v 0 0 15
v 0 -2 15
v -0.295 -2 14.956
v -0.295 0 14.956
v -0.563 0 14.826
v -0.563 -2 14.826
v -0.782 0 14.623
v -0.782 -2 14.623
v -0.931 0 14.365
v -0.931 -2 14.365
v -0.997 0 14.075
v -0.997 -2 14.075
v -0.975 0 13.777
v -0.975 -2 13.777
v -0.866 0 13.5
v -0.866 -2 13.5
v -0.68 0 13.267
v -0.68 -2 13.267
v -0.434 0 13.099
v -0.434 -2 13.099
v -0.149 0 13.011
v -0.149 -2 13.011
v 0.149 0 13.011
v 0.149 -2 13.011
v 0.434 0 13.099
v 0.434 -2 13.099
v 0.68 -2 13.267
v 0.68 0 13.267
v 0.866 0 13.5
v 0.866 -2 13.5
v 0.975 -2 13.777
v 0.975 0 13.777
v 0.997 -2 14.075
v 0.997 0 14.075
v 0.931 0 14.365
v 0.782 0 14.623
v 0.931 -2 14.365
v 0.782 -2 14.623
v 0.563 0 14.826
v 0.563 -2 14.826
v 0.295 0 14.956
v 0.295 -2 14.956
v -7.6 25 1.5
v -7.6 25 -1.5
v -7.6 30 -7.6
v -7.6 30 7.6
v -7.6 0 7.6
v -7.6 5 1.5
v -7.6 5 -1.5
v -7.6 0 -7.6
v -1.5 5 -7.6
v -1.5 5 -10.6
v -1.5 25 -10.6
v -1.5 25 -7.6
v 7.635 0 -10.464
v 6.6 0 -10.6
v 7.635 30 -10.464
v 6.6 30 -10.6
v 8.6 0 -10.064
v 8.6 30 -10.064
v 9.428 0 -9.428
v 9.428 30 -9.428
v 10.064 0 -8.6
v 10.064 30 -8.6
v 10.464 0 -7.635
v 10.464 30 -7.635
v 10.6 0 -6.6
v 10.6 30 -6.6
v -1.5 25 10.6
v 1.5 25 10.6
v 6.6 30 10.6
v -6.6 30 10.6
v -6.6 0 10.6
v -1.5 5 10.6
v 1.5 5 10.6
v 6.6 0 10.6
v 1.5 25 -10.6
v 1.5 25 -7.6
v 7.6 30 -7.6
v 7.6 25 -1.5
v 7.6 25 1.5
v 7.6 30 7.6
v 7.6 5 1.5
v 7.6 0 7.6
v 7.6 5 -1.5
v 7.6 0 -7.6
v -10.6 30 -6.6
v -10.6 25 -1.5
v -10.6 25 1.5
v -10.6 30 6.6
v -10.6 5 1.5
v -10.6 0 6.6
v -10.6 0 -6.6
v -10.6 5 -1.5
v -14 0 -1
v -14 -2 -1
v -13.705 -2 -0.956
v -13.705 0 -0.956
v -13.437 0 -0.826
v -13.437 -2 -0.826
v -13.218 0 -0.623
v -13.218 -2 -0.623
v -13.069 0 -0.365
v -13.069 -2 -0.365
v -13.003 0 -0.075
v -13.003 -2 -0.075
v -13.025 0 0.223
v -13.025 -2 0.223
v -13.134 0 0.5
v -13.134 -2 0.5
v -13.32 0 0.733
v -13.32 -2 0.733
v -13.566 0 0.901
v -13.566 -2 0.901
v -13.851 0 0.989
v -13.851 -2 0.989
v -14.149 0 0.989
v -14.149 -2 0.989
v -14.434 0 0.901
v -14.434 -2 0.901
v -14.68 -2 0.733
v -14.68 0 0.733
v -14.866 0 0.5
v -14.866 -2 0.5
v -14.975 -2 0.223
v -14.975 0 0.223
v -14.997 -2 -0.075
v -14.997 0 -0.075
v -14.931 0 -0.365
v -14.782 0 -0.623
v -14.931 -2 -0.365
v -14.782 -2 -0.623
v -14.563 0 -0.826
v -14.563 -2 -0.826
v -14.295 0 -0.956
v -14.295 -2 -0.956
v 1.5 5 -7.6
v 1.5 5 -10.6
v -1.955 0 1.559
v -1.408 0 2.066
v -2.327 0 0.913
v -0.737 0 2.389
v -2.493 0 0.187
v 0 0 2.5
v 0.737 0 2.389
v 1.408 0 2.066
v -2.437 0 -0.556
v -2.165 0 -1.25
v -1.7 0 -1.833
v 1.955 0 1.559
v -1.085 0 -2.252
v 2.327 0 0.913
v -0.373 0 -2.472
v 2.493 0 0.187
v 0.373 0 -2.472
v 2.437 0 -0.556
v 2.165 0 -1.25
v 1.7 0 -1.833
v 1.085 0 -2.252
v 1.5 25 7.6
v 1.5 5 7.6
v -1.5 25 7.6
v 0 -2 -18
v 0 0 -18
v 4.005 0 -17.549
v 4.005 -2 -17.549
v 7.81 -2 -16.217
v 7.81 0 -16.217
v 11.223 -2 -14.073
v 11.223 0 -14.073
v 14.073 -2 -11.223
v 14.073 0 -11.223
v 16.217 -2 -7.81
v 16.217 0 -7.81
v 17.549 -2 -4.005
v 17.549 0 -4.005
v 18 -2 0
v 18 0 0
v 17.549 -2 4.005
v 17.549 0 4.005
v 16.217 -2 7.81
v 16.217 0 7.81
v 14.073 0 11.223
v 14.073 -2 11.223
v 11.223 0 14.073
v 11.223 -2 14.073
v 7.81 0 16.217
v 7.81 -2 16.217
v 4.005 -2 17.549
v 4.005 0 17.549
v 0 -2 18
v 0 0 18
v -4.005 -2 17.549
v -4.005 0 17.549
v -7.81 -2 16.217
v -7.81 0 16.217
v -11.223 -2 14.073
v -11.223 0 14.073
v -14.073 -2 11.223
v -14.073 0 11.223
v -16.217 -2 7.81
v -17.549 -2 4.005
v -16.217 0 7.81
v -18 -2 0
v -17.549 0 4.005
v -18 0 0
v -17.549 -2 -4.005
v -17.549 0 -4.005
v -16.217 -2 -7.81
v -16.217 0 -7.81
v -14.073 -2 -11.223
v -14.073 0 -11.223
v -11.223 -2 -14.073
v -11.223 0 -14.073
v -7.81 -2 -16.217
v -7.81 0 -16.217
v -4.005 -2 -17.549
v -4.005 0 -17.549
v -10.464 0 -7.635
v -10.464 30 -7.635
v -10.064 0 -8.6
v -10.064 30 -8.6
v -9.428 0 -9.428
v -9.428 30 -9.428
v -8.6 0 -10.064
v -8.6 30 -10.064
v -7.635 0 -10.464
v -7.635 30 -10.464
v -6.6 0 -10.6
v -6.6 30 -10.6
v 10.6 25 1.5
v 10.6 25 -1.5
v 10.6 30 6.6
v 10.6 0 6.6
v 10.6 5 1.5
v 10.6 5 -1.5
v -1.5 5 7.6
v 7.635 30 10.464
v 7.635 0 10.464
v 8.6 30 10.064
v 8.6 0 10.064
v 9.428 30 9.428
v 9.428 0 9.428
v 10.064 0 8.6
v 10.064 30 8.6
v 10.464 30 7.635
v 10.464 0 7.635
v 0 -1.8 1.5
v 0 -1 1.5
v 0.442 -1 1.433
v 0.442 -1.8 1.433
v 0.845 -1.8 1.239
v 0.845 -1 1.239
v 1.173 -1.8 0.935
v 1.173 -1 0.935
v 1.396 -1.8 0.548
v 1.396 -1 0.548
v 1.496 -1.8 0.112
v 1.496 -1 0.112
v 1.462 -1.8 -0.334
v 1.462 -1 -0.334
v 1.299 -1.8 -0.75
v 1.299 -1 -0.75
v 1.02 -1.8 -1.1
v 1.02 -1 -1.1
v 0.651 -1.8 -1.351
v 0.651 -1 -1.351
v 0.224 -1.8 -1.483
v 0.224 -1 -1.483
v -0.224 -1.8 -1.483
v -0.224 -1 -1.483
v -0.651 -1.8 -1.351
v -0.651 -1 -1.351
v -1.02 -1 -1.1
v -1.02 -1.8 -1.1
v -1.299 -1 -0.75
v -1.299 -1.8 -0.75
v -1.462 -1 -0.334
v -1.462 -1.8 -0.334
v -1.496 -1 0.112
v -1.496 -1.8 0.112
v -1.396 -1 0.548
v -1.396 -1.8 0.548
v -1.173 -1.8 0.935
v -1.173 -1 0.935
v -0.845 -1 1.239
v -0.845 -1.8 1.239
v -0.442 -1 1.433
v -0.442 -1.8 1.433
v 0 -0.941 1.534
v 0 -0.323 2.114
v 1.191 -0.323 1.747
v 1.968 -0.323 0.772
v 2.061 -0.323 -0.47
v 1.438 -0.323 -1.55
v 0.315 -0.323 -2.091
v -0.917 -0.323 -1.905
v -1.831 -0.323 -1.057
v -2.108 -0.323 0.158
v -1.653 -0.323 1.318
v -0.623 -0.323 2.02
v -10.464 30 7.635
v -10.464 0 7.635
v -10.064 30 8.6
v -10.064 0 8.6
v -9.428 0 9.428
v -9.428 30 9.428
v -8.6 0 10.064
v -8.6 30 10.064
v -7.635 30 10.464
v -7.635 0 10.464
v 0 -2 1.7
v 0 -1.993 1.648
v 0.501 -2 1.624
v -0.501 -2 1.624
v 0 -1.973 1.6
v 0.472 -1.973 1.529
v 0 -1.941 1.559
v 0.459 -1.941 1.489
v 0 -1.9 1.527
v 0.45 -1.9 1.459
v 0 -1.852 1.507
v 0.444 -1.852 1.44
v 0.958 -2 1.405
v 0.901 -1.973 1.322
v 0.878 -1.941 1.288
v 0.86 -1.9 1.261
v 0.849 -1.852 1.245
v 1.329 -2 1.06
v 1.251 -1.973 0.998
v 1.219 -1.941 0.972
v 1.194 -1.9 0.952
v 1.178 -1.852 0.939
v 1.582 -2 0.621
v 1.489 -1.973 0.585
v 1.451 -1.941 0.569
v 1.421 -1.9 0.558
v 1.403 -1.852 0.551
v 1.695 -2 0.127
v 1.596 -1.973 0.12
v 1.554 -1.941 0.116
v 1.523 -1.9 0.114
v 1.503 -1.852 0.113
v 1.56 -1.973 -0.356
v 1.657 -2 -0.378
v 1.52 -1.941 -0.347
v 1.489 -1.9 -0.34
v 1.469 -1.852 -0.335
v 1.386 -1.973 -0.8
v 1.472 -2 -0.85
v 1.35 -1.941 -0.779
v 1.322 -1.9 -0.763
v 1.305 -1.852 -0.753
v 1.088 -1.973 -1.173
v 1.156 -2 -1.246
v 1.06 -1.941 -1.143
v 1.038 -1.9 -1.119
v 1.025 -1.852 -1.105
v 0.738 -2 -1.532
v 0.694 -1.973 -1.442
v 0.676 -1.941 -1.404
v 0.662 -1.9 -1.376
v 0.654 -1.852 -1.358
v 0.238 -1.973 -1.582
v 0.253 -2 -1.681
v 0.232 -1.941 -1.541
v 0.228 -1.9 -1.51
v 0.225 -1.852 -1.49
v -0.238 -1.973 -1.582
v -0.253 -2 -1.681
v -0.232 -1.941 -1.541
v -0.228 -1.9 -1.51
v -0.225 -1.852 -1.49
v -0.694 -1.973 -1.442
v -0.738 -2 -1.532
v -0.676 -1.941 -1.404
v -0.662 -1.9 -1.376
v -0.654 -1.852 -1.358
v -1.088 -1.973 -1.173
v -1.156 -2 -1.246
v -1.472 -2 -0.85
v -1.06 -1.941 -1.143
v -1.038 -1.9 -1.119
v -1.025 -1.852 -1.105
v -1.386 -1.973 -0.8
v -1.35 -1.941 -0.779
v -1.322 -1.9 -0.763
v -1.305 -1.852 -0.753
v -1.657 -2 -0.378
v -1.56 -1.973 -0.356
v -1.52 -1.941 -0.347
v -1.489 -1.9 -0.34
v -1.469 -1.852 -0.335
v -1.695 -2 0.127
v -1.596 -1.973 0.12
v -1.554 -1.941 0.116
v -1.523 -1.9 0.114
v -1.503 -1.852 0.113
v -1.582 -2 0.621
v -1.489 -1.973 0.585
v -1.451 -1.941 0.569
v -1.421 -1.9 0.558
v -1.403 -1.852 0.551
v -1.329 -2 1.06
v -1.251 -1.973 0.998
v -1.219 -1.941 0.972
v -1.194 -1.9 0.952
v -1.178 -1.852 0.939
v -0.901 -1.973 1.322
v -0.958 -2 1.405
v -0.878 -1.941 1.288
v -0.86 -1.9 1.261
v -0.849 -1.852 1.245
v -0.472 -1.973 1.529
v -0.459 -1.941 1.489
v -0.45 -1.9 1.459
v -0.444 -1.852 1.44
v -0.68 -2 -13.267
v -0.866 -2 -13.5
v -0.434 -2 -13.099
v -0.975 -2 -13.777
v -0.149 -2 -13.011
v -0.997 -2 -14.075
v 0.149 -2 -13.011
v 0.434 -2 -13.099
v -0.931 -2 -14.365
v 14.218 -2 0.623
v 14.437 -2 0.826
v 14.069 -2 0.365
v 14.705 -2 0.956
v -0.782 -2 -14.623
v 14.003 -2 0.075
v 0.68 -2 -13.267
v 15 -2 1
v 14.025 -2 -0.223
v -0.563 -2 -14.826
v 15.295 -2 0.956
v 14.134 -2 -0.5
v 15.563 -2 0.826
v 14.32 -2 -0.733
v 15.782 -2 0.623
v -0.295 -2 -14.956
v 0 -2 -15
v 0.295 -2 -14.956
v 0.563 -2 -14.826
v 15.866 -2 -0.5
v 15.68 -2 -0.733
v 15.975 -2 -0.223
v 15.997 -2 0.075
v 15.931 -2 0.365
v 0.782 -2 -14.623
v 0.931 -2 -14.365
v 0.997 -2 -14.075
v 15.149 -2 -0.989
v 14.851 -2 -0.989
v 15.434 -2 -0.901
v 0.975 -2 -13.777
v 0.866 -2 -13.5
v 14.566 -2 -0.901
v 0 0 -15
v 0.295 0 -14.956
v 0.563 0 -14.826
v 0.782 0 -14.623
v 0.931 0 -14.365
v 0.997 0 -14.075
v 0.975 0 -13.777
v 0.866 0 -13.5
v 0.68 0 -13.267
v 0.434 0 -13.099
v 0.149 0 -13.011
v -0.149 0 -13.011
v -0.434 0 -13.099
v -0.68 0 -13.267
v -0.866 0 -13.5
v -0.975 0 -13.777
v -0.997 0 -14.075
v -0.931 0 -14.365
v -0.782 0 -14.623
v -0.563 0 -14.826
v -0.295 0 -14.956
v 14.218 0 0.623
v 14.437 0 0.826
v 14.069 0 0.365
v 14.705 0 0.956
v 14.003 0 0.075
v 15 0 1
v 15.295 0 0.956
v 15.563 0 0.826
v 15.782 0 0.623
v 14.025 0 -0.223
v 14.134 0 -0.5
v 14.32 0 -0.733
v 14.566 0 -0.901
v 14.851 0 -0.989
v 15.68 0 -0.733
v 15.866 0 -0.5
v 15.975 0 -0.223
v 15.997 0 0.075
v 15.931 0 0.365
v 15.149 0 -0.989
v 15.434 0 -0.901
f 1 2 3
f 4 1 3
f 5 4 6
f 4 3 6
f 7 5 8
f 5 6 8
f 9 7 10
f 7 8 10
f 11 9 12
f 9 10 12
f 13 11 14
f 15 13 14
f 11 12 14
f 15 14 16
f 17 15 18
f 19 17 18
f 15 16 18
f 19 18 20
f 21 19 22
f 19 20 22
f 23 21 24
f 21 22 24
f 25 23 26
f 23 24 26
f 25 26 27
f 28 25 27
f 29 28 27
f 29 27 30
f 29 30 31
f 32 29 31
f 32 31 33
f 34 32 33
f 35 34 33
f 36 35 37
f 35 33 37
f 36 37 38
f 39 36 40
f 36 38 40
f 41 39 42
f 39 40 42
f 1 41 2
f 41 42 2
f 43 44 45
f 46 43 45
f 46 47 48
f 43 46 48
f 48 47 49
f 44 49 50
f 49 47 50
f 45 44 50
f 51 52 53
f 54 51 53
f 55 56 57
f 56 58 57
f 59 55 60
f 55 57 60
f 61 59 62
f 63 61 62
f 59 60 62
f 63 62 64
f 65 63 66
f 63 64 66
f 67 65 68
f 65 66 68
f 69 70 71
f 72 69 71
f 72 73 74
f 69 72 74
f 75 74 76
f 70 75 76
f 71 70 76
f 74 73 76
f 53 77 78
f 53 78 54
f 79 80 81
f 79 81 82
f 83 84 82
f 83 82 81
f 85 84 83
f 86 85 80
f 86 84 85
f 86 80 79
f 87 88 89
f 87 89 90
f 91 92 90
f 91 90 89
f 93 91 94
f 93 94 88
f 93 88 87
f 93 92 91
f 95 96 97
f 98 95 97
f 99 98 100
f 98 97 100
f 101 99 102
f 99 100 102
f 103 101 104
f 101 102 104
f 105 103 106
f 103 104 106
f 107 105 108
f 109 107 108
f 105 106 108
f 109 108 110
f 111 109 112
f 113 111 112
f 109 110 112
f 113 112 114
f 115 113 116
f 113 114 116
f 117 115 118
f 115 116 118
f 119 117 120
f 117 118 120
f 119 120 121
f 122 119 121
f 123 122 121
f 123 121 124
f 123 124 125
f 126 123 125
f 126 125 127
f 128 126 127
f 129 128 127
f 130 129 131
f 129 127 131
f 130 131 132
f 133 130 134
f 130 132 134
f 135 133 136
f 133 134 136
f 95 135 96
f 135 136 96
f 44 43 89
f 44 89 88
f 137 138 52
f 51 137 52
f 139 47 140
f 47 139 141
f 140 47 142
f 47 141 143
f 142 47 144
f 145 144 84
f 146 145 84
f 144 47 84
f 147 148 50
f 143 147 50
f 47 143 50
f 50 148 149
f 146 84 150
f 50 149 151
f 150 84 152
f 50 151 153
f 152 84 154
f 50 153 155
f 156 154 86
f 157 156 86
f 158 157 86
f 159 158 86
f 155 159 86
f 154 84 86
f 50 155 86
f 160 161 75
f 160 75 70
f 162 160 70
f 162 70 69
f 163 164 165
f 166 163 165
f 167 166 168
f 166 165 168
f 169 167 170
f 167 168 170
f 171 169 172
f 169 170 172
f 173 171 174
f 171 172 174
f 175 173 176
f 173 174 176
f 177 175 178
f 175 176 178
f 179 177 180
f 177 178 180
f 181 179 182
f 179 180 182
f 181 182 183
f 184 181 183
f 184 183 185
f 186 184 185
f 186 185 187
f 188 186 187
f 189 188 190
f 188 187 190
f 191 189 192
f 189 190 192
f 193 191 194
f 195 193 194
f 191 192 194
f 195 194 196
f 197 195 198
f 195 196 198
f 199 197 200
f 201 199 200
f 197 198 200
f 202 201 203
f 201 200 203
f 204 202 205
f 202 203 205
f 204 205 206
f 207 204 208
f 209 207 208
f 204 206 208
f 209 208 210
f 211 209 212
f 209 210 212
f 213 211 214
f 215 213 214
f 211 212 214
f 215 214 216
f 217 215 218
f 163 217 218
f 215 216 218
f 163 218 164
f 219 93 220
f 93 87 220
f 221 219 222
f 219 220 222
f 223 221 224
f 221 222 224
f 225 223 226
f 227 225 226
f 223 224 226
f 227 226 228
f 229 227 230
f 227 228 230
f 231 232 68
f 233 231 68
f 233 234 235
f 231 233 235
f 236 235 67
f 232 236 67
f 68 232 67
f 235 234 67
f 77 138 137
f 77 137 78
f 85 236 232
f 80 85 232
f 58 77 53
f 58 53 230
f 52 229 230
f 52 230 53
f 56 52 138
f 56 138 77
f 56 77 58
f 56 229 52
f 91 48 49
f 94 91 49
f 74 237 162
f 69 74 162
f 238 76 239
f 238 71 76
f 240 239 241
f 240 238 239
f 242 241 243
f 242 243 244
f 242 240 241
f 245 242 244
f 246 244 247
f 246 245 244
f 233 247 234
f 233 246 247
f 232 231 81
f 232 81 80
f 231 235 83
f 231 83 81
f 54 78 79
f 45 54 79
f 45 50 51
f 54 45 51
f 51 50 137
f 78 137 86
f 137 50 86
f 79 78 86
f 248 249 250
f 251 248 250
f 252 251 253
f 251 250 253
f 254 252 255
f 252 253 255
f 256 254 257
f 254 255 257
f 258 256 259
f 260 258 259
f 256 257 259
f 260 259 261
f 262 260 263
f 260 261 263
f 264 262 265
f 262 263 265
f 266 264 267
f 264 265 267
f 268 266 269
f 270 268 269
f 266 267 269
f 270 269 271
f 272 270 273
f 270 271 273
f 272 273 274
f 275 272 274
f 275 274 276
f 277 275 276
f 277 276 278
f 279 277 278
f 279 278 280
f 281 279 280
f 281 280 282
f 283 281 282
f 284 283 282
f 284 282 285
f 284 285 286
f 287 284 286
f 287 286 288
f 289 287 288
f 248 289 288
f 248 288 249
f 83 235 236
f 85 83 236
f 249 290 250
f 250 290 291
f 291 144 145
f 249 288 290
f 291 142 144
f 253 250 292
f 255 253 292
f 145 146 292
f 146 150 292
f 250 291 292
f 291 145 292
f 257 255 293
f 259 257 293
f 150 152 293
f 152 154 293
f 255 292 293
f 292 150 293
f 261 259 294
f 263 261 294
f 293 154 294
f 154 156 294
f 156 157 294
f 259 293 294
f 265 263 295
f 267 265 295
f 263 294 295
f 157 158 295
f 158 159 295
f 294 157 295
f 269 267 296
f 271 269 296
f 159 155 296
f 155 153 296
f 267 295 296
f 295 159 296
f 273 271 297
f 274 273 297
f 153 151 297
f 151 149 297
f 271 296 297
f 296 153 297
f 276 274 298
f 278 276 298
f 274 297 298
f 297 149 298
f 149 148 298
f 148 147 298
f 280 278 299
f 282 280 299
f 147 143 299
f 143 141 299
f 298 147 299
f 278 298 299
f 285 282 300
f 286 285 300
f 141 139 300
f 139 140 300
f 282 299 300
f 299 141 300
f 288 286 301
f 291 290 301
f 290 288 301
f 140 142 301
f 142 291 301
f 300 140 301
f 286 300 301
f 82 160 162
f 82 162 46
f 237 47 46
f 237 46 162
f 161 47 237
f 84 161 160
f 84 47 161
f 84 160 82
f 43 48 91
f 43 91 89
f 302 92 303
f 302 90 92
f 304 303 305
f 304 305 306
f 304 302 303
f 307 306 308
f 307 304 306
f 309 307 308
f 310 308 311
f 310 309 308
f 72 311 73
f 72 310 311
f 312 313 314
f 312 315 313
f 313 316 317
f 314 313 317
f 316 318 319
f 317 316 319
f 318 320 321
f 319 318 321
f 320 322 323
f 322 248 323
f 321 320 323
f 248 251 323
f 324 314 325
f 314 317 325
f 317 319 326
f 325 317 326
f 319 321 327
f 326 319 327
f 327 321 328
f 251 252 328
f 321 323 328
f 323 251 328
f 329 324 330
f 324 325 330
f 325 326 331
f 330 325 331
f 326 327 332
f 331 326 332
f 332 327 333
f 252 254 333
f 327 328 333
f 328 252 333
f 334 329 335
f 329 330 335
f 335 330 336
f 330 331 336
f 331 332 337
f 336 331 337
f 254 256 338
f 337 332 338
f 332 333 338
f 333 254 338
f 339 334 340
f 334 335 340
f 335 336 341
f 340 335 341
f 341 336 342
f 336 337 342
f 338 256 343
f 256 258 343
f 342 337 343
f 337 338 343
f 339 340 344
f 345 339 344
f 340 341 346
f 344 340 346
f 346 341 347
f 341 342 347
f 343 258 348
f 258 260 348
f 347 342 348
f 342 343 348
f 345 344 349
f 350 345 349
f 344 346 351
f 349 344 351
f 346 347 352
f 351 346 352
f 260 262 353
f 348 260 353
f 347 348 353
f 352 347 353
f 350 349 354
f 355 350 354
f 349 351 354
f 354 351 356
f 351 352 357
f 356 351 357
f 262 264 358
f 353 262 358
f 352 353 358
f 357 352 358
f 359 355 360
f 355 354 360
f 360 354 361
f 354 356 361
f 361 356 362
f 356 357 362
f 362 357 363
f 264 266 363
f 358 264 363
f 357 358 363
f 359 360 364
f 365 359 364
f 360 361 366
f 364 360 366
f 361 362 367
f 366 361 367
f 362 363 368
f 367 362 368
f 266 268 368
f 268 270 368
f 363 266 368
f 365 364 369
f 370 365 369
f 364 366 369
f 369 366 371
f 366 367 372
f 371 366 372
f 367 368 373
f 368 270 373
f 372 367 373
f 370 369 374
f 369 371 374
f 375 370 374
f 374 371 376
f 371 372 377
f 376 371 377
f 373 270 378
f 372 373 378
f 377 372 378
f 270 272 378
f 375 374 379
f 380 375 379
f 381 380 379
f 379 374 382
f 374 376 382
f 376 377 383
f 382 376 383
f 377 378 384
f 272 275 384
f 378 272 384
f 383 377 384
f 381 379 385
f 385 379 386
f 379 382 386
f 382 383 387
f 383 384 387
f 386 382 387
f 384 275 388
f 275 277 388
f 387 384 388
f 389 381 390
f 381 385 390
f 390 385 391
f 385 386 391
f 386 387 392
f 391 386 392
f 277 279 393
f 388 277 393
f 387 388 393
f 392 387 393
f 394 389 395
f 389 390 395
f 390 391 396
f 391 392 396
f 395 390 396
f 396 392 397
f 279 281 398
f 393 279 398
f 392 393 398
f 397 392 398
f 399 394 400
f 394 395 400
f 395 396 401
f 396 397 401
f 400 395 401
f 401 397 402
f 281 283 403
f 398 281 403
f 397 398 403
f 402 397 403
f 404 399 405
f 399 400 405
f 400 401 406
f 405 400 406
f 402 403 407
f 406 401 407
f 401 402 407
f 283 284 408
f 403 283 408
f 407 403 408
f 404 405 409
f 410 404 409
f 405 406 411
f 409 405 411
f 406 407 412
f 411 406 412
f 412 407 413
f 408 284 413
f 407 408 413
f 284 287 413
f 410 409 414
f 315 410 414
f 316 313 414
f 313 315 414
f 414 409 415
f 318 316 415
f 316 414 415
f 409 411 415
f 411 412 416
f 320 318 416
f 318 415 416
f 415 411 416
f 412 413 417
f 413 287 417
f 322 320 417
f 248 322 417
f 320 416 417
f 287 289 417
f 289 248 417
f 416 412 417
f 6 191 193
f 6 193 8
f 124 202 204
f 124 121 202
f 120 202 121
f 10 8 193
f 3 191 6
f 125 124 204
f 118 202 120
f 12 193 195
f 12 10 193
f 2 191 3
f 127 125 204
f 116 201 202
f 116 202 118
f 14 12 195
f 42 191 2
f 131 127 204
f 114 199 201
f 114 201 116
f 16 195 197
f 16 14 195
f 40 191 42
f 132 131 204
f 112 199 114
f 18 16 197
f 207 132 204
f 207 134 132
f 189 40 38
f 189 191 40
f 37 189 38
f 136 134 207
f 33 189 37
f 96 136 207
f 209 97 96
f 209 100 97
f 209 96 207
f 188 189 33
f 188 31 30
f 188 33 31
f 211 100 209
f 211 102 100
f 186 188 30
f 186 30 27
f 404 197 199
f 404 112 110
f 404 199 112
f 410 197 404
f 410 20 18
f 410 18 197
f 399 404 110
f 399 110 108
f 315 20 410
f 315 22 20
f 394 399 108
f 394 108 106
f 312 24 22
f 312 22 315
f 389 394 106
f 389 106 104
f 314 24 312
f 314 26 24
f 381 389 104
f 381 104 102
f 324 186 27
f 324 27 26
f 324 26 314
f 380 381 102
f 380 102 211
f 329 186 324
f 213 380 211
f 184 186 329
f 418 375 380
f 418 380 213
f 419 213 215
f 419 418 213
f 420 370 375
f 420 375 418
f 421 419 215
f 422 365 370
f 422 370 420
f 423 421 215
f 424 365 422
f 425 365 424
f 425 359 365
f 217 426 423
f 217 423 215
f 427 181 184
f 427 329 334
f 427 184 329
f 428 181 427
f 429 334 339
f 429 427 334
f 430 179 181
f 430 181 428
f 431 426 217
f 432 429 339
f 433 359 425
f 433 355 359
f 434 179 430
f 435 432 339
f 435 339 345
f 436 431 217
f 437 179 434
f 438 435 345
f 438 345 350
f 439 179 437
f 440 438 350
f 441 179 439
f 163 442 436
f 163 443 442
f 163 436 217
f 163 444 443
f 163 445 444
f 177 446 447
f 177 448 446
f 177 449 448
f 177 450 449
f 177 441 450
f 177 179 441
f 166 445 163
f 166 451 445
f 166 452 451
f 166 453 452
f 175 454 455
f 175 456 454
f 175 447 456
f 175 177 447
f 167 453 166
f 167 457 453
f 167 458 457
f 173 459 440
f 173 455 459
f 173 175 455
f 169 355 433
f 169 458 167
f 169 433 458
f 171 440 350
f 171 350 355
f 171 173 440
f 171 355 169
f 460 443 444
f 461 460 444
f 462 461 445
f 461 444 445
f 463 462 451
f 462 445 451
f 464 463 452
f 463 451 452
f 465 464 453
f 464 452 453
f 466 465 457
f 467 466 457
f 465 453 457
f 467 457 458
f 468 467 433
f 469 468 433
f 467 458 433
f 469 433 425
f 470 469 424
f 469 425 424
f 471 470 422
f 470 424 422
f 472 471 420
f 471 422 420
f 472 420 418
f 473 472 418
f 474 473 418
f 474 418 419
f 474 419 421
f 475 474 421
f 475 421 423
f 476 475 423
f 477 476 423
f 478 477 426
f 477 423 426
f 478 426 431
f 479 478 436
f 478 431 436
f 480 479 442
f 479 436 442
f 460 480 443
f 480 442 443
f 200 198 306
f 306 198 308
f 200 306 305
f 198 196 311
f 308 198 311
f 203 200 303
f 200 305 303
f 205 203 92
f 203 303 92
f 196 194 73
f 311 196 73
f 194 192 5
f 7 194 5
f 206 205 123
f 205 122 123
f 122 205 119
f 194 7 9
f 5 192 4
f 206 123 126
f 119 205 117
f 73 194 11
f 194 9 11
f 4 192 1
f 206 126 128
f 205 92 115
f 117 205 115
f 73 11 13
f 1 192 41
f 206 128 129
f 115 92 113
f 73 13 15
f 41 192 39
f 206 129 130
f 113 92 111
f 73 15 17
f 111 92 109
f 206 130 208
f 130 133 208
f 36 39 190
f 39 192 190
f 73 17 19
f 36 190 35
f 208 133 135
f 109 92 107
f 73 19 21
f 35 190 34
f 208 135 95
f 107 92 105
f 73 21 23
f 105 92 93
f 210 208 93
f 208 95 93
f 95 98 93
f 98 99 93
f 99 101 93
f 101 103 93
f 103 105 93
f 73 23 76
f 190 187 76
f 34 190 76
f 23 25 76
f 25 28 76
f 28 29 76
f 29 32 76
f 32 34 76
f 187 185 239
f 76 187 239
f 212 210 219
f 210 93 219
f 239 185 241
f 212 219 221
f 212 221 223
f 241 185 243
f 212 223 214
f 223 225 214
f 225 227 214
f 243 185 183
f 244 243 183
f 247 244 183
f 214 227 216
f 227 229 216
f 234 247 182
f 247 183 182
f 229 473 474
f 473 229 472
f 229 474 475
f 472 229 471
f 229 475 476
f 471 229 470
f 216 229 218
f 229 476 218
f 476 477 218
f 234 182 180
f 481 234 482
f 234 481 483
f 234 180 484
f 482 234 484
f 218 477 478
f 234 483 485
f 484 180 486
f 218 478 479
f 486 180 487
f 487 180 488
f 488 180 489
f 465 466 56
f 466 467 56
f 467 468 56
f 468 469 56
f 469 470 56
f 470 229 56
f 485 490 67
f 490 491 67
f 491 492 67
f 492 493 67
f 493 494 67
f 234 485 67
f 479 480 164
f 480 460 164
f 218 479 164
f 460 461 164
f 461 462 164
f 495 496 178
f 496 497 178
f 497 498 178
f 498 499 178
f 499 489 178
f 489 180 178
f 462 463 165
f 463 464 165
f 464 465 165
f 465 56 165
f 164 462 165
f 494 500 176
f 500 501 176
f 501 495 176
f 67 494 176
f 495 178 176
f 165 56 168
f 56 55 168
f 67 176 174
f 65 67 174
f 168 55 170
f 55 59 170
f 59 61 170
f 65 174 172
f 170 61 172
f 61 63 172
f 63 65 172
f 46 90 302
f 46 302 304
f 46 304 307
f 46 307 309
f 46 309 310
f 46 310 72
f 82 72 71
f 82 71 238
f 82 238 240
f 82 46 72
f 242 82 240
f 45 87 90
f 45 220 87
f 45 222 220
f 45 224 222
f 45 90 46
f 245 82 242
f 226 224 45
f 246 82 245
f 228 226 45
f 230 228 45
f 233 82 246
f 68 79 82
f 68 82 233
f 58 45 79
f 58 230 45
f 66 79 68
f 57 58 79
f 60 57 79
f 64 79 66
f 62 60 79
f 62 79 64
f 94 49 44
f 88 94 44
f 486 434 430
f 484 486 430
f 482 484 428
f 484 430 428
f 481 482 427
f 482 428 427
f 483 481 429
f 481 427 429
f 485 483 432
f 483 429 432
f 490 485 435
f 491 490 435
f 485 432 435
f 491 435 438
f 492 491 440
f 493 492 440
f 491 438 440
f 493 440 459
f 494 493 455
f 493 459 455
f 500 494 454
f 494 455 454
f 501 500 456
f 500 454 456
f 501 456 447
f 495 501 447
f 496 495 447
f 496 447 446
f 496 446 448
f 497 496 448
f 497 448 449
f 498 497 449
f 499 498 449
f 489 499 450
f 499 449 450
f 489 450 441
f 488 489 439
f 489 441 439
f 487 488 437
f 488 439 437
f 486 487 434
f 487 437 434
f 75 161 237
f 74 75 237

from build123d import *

# Parameters (mm, degrees)
SKETCH1_W           = 21.2
SKETCH1_H           = 21.2
SKETCH1_W_2         = 15.2
SKETCH1_H_2         = 15.2
BOSS_EXTRUDE1_DEPTH = 30
FILLET1_R           = 4
SKETCH3_R           = 18
BOSS_EXTRUDE2_DEPTH = 2
CUT_EXTRUDE2_REACH  = 41.345
SKETCH4_R           = 1.5
SKETCH5_W           = 3
SKETCH5_H           = 20
CUT_EXTRUDE3_DEPTH  = 46.188051518
SKETCH6_W           = 3
SKETCH6_H           = 20
CUT_EXTRUDE4_DEPTH  = 46.188051518
SKETCH7_R           = 1
CUT_EXTRUDE5_DEPTH  = 2
FILLET4_SIZE        = 1
FILLET5_R           = 0.2


with BuildPart() as part:
    # Sketch1 → Boss-Extrude1 (new body)
    with BuildSketch(Plane(origin=(0, 0, 0), x_dir=(1, 0, 0), z_dir=(0, 1, 0))):
        Rectangle(SKETCH1_W, SKETCH1_H)
        Rectangle(SKETCH1_W_2, SKETCH1_H_2, mode=Mode.SUBTRACT)
    extrude(amount=BOSS_EXTRUDE1_DEPTH)

    # Fillet1
    fillet1_edges = [part.edges().sort_by_distance(p)[0] for p in [
        (10.6, 15, 10.6),
        (-10.6, 15, 10.6),
        (-10.6, 15, -10.6),
        (10.6, 15, -10.6),
    ]]
    fillet(fillet1_edges, radius=FILLET1_R)

    # Sketch3 → Boss-Extrude2 (add)
    with BuildSketch(Plane.XZ):
        with Locations(Location((0, 0, 0), (0, 0, 270))):
            Circle(SKETCH3_R)
    extrude(amount=BOSS_EXTRUDE2_DEPTH)

    # Sketch4 → Cut-Extrude2 (cut, up to next)
    with BuildSketch(Plane(origin=(0, 0, 0), x_dir=(1, 0, 0), z_dir=(0, 1, 0)), mode=Mode.PRIVATE) as cut_extrude2_sk1:
        with Locations(Location((0, 0, 0), (0, 0, 270))):
            Circle(SKETCH4_R)
    cut_extrude2_tool1 = extrude(cut_extrude2_sk1.sketch, amount=-CUT_EXTRUDE2_REACH, mode=Mode.PRIVATE) & part.part
    add(cut_extrude2_tool1.solids().sort_by_distance((0, 0, 0))[0], mode=Mode.SUBTRACT)

    # Sketch5 → Cut-Extrude3 (cut, through all)
    with BuildSketch(Plane(origin=(0, 0, -10.6), x_dir=(-1, 0, 0), z_dir=(0, 0, -1))):
        with Locations((0, 15)):
            Rectangle(SKETCH5_W, SKETCH5_H)
    extrude(amount=-CUT_EXTRUDE3_DEPTH, mode=Mode.SUBTRACT)

    # Sketch6 → Cut-Extrude4 (cut, through all)
    with BuildSketch(Plane(origin=(10.6, 0, 0), x_dir=(0, 0, -1), z_dir=(1, 0, 0))):
        with Locations((0, 15)):
            Rectangle(SKETCH6_W, SKETCH6_H)
    extrude(amount=-CUT_EXTRUDE4_DEPTH, mode=Mode.SUBTRACT)

    # Sketch7 → Cut-Extrude5 (cut)
    with BuildSketch(Plane(origin=(0, -2, 0), x_dir=(-1, 0, 0), z_dir=(0, -1, 0))):
        with Locations(Location((14, 0, 0), (0, 0, 90))):
            Circle(SKETCH7_R)
        with Locations(Location((-15, 0, 0), (0, 0, 270))):
            Circle(SKETCH7_R)
        with Locations(Location((0, 14, 0), (0, 0, 90))):
            Circle(SKETCH7_R)
        with Locations(Location((0, -14, 0), (0, 0, 270))):
            Circle(SKETCH7_R)
    extrude(amount=-CUT_EXTRUDE5_DEPTH, mode=Mode.SUBTRACT)

    # Fillet4
    # a fillet whose section is not a circle: 1 mm, written as the material it takes off along each edge
    with BuildSketch(Plane(origin=(0, 0, 0), x_dir=(0, 0, 1), z_dir=(-1, 0, 0))) as fillet4_piece_1:
        with BuildLine():
            Bezier((1.5, -FILLET4_SIZE), (1.5, 0), (1.5 + FILLET4_SIZE, 0), weights=[1, 0.070710678, 1])
            Line((1.5 + FILLET4_SIZE, 0), (1.5, 0))
            Line((1.5, 0), (1.5, -FILLET4_SIZE))
        make_face()
    revolve(axis=Axis((0, 0, 0), (0, 1, 0)), mode=Mode.SUBTRACT)

    # Fillet5
    fillet5_edges = [part.edges().sort_by_distance(p)[0] for p in [
        (0, -2, -1.5),
    ]]
    fillet(fillet5_edges, radius=FILLET5_R)


solid = part.part
